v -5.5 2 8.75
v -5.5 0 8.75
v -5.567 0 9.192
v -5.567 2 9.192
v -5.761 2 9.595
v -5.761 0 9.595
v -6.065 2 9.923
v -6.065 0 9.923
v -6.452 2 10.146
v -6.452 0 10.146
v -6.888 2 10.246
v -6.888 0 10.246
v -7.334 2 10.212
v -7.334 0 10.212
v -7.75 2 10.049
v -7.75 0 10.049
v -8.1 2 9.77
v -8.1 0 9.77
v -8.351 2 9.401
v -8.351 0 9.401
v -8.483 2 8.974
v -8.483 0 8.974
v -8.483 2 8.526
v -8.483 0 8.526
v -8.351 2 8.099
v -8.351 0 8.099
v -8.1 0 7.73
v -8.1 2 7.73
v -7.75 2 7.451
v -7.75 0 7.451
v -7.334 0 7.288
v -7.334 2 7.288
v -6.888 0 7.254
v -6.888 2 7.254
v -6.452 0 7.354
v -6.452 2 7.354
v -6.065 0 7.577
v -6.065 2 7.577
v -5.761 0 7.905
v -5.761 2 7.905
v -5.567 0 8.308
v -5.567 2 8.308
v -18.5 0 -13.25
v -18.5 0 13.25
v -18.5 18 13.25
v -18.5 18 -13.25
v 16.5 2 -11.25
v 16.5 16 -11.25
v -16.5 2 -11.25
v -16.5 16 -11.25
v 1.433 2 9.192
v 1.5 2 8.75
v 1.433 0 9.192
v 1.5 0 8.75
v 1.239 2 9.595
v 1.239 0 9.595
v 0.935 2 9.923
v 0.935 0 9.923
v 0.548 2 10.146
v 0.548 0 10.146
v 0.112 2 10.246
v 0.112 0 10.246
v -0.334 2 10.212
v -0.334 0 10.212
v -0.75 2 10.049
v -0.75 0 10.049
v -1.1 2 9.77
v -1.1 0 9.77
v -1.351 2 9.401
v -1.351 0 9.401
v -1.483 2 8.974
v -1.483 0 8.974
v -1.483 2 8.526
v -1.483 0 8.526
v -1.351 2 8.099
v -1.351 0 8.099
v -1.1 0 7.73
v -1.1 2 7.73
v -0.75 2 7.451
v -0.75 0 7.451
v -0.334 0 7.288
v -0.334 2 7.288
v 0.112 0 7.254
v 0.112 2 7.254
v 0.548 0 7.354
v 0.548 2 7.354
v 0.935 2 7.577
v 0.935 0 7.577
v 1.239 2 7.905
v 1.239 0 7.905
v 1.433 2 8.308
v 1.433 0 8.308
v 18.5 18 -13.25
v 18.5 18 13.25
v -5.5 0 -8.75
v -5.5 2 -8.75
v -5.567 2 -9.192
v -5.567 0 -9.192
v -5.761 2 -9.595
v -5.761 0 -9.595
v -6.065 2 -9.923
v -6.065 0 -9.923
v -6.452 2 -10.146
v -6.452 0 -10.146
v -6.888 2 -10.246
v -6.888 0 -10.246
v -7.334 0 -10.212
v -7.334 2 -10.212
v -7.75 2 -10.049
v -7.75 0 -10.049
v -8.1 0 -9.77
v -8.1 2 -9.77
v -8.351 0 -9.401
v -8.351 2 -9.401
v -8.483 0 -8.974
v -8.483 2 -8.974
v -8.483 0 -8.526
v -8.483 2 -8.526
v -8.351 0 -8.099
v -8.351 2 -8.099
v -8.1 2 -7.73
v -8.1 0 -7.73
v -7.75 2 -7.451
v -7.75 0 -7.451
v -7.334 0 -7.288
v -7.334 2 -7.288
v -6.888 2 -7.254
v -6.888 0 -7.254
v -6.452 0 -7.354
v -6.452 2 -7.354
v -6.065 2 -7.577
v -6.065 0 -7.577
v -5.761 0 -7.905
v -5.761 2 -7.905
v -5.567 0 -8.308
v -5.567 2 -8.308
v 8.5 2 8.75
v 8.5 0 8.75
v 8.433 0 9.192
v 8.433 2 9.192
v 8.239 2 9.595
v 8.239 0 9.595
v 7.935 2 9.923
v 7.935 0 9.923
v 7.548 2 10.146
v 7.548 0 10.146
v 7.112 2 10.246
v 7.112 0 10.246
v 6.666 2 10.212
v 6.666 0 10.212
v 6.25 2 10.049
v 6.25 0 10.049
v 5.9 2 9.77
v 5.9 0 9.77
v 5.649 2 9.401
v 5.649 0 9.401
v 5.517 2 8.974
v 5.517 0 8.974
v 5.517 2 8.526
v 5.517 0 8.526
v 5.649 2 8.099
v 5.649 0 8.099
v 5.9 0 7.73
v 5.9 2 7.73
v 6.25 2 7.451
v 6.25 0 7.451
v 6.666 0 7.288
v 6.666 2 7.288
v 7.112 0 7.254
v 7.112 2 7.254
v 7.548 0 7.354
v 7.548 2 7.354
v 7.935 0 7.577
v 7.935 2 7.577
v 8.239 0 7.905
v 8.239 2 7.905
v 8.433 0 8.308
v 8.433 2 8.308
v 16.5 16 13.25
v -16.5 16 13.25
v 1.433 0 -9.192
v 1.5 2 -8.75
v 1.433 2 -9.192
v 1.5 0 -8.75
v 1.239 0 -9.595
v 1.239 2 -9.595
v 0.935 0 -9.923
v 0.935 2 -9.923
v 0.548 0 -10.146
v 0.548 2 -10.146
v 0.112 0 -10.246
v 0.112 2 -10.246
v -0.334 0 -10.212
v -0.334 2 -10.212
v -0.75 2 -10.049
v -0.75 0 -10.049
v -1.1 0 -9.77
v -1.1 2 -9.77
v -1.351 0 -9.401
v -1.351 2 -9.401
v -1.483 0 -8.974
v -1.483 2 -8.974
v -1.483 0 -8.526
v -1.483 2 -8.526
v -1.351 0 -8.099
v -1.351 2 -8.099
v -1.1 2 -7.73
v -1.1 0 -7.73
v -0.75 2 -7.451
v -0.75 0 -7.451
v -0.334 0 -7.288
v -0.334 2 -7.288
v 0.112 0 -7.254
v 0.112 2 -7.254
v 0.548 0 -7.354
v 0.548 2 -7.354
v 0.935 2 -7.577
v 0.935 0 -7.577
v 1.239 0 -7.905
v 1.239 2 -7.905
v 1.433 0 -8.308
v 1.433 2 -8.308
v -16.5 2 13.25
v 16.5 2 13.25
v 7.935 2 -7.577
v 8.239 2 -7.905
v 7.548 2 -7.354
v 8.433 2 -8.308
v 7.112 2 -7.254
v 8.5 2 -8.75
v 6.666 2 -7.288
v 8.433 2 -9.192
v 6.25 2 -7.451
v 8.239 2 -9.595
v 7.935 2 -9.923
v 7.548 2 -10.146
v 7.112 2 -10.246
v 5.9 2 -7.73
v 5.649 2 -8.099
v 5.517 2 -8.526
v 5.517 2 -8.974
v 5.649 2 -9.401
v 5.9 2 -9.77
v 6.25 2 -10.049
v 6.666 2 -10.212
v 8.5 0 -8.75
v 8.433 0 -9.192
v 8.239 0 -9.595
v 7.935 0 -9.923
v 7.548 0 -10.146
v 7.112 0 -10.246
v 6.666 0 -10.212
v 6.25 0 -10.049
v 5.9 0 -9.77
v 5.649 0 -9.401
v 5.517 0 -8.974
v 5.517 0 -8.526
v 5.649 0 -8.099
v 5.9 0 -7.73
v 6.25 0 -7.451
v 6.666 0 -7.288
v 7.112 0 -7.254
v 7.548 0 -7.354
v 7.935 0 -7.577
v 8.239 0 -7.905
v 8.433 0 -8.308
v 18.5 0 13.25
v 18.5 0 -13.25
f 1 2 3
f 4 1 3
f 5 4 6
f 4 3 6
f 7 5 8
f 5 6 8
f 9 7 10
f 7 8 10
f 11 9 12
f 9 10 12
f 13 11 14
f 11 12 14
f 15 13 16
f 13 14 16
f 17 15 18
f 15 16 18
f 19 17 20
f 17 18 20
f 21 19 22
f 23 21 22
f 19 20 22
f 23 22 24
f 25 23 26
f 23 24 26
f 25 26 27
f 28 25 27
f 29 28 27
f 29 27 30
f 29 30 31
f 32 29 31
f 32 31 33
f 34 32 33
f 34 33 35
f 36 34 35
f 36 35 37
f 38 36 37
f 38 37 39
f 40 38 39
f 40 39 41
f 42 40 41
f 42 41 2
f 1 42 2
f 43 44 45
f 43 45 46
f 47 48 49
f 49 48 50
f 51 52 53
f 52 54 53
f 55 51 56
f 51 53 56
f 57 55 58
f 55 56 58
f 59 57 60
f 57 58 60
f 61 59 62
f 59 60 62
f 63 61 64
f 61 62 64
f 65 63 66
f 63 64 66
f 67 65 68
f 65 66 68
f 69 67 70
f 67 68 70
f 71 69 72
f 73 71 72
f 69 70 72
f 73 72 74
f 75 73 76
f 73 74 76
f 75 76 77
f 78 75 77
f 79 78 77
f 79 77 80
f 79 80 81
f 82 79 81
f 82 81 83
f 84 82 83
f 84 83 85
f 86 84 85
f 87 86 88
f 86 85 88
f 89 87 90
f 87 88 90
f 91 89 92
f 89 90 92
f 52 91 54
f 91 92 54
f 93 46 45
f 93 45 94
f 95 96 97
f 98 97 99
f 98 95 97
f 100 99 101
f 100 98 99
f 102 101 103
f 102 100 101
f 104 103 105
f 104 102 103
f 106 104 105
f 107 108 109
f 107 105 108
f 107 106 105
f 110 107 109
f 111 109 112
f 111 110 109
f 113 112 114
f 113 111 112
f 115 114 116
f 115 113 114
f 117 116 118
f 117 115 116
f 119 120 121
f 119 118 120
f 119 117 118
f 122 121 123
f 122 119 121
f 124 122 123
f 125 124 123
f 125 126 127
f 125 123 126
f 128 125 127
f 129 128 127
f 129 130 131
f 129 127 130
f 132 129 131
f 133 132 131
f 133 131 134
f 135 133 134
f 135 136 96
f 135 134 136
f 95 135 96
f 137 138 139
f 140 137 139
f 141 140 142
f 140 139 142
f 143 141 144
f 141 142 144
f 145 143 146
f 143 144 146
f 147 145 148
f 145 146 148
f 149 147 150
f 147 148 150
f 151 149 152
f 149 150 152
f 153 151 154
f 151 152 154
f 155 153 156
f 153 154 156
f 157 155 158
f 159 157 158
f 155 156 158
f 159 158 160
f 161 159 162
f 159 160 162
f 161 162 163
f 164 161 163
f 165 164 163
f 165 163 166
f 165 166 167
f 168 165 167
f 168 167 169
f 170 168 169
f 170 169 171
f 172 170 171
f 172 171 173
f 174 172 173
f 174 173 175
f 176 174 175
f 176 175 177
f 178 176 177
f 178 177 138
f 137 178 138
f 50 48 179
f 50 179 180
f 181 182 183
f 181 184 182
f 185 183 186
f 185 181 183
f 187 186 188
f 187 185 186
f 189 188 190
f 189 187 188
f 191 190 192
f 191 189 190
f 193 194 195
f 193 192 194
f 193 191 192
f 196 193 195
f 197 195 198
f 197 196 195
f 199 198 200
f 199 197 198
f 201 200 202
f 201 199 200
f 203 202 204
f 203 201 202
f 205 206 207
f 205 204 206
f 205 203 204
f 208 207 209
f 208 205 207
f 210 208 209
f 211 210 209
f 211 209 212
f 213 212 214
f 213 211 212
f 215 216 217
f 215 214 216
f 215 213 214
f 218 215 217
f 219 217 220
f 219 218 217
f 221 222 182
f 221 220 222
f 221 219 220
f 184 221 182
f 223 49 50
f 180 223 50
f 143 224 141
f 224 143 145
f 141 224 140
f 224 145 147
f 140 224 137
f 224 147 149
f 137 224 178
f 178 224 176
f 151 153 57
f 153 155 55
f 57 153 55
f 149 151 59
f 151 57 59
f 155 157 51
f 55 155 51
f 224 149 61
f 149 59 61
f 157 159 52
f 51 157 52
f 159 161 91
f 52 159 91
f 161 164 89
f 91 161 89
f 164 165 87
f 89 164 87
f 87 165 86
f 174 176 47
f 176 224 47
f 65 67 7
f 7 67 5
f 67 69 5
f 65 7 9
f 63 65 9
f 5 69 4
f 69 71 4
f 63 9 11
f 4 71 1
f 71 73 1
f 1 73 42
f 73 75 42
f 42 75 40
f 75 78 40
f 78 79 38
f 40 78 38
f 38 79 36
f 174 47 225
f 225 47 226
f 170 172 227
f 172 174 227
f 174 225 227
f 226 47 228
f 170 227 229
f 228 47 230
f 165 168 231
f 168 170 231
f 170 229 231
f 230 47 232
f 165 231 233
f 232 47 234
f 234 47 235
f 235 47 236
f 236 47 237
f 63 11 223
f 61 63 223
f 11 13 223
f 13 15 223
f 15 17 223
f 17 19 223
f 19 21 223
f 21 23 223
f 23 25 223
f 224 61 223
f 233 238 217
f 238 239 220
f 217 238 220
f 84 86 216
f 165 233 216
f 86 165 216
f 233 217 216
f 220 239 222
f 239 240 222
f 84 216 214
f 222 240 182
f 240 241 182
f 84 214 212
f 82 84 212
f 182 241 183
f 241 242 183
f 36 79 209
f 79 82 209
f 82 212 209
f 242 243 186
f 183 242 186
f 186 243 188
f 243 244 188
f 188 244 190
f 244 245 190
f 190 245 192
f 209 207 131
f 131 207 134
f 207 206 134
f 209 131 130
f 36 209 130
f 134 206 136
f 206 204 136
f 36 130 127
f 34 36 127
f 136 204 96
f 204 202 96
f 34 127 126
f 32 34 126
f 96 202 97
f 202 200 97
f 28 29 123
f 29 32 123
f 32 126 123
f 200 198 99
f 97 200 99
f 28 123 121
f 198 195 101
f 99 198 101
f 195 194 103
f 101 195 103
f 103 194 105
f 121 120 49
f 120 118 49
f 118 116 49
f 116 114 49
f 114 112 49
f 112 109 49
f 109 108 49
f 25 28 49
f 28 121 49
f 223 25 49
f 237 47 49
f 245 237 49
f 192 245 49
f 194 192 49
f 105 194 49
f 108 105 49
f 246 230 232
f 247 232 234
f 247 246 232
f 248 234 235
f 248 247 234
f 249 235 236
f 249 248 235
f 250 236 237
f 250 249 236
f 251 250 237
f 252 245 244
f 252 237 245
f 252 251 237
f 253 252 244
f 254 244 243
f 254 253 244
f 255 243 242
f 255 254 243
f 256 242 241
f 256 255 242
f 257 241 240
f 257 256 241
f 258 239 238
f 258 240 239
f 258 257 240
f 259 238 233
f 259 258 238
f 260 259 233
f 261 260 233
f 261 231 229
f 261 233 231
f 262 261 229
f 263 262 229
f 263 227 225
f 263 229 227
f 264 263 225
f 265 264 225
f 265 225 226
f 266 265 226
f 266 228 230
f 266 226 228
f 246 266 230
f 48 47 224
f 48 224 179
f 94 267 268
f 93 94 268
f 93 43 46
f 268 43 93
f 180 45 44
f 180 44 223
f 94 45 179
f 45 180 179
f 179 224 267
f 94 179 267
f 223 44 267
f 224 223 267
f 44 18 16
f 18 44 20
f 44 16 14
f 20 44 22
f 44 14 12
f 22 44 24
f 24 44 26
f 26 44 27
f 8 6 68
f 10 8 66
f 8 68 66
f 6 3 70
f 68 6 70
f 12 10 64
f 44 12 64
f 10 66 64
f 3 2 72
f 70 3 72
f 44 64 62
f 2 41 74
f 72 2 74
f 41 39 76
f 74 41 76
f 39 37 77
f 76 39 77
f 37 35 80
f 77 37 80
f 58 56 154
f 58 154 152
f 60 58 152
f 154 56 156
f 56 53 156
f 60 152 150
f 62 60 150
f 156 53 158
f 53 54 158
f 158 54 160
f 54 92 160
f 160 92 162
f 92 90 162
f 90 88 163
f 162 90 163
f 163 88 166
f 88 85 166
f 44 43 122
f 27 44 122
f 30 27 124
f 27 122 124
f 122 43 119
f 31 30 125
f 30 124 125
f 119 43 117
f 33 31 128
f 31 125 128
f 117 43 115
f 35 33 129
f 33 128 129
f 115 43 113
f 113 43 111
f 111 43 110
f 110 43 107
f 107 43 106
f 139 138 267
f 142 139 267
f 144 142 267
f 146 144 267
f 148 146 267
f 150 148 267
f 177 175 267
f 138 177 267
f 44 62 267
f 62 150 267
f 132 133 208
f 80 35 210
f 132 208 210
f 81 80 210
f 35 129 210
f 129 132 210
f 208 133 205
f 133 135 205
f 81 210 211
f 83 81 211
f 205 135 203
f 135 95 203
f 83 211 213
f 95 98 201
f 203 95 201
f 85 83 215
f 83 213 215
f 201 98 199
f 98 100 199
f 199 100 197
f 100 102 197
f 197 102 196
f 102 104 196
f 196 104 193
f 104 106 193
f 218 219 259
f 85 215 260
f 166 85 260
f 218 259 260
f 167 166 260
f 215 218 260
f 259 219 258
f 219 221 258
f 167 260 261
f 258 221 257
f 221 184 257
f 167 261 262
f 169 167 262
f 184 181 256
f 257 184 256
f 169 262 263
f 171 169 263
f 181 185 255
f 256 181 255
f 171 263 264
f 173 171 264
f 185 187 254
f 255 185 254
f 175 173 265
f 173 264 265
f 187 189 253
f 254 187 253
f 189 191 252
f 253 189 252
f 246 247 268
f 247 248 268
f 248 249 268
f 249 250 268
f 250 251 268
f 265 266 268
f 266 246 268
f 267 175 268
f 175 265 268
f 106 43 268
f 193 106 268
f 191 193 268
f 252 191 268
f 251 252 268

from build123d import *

# Parameters (mm, degrees)
SKIZZE1_W                       = 37
SKIZZE1_H                       = 26.5
AUFSATZ_LINEAR_AUSTRAGEN1_DEPTH = 18
SKIZZE5_W                       = 33
SKIZZE5_H                       = 14
SCHNITT_LINEAR_AUSTRAGEN1_DEPTH = 28
SKIZZE6_R                       = 1.5
SCHNITT_LINEAR_AUSTRAGEN2_DEPTH = 4


with BuildPart() as part:
    # Skizze1 → Aufsatz-Linear austragen1 (new body)
    with BuildSketch(Plane(origin=(0, 0, 0), x_dir=(1, 0, 0), z_dir=(0, 1, 0))):
        Rectangle(SKIZZE1_W, SKIZZE1_H)
    extrude(amount=AUFSATZ_LINEAR_AUSTRAGEN1_DEPTH)

    # Skizze5 → Schnitt-Linear austragen1 (cut)
    with BuildSketch(Plane(origin=(0, 0, -11.25), x_dir=(-1, 0, 0), z_dir=(0, 0, -1))):
        with Locations((0, 9)):
            Rectangle(SKIZZE5_W, SKIZZE5_H)
    extrude(amount=-SCHNITT_LINEAR_AUSTRAGEN1_DEPTH, mode=Mode.SUBTRACT)

    # Skizze6 → Schnitt-Linear austragen2 (cut, symmetric)
    with BuildSketch(Plane.XZ):
        with Locations((-7, 8.75)):
            Circle(SKIZZE6_R)
        with Locations((7, 8.75)):
            Circle(SKIZZE6_R)
        with Locations((0, 8.75)):
            Circle(SKIZZE6_R)
    schnitt_linear_austragen2 = extrude(amount=SCHNITT_LINEAR_AUSTRAGEN2_DEPTH, both=True, mode=Mode.SUBTRACT)

    # Spiegeln1: Schnitt-Linear austragen2 across plane
    add(schnitt_linear_austragen2.mirror(Plane.XY), mode=Mode.SUBTRACT)


solid = part.part
